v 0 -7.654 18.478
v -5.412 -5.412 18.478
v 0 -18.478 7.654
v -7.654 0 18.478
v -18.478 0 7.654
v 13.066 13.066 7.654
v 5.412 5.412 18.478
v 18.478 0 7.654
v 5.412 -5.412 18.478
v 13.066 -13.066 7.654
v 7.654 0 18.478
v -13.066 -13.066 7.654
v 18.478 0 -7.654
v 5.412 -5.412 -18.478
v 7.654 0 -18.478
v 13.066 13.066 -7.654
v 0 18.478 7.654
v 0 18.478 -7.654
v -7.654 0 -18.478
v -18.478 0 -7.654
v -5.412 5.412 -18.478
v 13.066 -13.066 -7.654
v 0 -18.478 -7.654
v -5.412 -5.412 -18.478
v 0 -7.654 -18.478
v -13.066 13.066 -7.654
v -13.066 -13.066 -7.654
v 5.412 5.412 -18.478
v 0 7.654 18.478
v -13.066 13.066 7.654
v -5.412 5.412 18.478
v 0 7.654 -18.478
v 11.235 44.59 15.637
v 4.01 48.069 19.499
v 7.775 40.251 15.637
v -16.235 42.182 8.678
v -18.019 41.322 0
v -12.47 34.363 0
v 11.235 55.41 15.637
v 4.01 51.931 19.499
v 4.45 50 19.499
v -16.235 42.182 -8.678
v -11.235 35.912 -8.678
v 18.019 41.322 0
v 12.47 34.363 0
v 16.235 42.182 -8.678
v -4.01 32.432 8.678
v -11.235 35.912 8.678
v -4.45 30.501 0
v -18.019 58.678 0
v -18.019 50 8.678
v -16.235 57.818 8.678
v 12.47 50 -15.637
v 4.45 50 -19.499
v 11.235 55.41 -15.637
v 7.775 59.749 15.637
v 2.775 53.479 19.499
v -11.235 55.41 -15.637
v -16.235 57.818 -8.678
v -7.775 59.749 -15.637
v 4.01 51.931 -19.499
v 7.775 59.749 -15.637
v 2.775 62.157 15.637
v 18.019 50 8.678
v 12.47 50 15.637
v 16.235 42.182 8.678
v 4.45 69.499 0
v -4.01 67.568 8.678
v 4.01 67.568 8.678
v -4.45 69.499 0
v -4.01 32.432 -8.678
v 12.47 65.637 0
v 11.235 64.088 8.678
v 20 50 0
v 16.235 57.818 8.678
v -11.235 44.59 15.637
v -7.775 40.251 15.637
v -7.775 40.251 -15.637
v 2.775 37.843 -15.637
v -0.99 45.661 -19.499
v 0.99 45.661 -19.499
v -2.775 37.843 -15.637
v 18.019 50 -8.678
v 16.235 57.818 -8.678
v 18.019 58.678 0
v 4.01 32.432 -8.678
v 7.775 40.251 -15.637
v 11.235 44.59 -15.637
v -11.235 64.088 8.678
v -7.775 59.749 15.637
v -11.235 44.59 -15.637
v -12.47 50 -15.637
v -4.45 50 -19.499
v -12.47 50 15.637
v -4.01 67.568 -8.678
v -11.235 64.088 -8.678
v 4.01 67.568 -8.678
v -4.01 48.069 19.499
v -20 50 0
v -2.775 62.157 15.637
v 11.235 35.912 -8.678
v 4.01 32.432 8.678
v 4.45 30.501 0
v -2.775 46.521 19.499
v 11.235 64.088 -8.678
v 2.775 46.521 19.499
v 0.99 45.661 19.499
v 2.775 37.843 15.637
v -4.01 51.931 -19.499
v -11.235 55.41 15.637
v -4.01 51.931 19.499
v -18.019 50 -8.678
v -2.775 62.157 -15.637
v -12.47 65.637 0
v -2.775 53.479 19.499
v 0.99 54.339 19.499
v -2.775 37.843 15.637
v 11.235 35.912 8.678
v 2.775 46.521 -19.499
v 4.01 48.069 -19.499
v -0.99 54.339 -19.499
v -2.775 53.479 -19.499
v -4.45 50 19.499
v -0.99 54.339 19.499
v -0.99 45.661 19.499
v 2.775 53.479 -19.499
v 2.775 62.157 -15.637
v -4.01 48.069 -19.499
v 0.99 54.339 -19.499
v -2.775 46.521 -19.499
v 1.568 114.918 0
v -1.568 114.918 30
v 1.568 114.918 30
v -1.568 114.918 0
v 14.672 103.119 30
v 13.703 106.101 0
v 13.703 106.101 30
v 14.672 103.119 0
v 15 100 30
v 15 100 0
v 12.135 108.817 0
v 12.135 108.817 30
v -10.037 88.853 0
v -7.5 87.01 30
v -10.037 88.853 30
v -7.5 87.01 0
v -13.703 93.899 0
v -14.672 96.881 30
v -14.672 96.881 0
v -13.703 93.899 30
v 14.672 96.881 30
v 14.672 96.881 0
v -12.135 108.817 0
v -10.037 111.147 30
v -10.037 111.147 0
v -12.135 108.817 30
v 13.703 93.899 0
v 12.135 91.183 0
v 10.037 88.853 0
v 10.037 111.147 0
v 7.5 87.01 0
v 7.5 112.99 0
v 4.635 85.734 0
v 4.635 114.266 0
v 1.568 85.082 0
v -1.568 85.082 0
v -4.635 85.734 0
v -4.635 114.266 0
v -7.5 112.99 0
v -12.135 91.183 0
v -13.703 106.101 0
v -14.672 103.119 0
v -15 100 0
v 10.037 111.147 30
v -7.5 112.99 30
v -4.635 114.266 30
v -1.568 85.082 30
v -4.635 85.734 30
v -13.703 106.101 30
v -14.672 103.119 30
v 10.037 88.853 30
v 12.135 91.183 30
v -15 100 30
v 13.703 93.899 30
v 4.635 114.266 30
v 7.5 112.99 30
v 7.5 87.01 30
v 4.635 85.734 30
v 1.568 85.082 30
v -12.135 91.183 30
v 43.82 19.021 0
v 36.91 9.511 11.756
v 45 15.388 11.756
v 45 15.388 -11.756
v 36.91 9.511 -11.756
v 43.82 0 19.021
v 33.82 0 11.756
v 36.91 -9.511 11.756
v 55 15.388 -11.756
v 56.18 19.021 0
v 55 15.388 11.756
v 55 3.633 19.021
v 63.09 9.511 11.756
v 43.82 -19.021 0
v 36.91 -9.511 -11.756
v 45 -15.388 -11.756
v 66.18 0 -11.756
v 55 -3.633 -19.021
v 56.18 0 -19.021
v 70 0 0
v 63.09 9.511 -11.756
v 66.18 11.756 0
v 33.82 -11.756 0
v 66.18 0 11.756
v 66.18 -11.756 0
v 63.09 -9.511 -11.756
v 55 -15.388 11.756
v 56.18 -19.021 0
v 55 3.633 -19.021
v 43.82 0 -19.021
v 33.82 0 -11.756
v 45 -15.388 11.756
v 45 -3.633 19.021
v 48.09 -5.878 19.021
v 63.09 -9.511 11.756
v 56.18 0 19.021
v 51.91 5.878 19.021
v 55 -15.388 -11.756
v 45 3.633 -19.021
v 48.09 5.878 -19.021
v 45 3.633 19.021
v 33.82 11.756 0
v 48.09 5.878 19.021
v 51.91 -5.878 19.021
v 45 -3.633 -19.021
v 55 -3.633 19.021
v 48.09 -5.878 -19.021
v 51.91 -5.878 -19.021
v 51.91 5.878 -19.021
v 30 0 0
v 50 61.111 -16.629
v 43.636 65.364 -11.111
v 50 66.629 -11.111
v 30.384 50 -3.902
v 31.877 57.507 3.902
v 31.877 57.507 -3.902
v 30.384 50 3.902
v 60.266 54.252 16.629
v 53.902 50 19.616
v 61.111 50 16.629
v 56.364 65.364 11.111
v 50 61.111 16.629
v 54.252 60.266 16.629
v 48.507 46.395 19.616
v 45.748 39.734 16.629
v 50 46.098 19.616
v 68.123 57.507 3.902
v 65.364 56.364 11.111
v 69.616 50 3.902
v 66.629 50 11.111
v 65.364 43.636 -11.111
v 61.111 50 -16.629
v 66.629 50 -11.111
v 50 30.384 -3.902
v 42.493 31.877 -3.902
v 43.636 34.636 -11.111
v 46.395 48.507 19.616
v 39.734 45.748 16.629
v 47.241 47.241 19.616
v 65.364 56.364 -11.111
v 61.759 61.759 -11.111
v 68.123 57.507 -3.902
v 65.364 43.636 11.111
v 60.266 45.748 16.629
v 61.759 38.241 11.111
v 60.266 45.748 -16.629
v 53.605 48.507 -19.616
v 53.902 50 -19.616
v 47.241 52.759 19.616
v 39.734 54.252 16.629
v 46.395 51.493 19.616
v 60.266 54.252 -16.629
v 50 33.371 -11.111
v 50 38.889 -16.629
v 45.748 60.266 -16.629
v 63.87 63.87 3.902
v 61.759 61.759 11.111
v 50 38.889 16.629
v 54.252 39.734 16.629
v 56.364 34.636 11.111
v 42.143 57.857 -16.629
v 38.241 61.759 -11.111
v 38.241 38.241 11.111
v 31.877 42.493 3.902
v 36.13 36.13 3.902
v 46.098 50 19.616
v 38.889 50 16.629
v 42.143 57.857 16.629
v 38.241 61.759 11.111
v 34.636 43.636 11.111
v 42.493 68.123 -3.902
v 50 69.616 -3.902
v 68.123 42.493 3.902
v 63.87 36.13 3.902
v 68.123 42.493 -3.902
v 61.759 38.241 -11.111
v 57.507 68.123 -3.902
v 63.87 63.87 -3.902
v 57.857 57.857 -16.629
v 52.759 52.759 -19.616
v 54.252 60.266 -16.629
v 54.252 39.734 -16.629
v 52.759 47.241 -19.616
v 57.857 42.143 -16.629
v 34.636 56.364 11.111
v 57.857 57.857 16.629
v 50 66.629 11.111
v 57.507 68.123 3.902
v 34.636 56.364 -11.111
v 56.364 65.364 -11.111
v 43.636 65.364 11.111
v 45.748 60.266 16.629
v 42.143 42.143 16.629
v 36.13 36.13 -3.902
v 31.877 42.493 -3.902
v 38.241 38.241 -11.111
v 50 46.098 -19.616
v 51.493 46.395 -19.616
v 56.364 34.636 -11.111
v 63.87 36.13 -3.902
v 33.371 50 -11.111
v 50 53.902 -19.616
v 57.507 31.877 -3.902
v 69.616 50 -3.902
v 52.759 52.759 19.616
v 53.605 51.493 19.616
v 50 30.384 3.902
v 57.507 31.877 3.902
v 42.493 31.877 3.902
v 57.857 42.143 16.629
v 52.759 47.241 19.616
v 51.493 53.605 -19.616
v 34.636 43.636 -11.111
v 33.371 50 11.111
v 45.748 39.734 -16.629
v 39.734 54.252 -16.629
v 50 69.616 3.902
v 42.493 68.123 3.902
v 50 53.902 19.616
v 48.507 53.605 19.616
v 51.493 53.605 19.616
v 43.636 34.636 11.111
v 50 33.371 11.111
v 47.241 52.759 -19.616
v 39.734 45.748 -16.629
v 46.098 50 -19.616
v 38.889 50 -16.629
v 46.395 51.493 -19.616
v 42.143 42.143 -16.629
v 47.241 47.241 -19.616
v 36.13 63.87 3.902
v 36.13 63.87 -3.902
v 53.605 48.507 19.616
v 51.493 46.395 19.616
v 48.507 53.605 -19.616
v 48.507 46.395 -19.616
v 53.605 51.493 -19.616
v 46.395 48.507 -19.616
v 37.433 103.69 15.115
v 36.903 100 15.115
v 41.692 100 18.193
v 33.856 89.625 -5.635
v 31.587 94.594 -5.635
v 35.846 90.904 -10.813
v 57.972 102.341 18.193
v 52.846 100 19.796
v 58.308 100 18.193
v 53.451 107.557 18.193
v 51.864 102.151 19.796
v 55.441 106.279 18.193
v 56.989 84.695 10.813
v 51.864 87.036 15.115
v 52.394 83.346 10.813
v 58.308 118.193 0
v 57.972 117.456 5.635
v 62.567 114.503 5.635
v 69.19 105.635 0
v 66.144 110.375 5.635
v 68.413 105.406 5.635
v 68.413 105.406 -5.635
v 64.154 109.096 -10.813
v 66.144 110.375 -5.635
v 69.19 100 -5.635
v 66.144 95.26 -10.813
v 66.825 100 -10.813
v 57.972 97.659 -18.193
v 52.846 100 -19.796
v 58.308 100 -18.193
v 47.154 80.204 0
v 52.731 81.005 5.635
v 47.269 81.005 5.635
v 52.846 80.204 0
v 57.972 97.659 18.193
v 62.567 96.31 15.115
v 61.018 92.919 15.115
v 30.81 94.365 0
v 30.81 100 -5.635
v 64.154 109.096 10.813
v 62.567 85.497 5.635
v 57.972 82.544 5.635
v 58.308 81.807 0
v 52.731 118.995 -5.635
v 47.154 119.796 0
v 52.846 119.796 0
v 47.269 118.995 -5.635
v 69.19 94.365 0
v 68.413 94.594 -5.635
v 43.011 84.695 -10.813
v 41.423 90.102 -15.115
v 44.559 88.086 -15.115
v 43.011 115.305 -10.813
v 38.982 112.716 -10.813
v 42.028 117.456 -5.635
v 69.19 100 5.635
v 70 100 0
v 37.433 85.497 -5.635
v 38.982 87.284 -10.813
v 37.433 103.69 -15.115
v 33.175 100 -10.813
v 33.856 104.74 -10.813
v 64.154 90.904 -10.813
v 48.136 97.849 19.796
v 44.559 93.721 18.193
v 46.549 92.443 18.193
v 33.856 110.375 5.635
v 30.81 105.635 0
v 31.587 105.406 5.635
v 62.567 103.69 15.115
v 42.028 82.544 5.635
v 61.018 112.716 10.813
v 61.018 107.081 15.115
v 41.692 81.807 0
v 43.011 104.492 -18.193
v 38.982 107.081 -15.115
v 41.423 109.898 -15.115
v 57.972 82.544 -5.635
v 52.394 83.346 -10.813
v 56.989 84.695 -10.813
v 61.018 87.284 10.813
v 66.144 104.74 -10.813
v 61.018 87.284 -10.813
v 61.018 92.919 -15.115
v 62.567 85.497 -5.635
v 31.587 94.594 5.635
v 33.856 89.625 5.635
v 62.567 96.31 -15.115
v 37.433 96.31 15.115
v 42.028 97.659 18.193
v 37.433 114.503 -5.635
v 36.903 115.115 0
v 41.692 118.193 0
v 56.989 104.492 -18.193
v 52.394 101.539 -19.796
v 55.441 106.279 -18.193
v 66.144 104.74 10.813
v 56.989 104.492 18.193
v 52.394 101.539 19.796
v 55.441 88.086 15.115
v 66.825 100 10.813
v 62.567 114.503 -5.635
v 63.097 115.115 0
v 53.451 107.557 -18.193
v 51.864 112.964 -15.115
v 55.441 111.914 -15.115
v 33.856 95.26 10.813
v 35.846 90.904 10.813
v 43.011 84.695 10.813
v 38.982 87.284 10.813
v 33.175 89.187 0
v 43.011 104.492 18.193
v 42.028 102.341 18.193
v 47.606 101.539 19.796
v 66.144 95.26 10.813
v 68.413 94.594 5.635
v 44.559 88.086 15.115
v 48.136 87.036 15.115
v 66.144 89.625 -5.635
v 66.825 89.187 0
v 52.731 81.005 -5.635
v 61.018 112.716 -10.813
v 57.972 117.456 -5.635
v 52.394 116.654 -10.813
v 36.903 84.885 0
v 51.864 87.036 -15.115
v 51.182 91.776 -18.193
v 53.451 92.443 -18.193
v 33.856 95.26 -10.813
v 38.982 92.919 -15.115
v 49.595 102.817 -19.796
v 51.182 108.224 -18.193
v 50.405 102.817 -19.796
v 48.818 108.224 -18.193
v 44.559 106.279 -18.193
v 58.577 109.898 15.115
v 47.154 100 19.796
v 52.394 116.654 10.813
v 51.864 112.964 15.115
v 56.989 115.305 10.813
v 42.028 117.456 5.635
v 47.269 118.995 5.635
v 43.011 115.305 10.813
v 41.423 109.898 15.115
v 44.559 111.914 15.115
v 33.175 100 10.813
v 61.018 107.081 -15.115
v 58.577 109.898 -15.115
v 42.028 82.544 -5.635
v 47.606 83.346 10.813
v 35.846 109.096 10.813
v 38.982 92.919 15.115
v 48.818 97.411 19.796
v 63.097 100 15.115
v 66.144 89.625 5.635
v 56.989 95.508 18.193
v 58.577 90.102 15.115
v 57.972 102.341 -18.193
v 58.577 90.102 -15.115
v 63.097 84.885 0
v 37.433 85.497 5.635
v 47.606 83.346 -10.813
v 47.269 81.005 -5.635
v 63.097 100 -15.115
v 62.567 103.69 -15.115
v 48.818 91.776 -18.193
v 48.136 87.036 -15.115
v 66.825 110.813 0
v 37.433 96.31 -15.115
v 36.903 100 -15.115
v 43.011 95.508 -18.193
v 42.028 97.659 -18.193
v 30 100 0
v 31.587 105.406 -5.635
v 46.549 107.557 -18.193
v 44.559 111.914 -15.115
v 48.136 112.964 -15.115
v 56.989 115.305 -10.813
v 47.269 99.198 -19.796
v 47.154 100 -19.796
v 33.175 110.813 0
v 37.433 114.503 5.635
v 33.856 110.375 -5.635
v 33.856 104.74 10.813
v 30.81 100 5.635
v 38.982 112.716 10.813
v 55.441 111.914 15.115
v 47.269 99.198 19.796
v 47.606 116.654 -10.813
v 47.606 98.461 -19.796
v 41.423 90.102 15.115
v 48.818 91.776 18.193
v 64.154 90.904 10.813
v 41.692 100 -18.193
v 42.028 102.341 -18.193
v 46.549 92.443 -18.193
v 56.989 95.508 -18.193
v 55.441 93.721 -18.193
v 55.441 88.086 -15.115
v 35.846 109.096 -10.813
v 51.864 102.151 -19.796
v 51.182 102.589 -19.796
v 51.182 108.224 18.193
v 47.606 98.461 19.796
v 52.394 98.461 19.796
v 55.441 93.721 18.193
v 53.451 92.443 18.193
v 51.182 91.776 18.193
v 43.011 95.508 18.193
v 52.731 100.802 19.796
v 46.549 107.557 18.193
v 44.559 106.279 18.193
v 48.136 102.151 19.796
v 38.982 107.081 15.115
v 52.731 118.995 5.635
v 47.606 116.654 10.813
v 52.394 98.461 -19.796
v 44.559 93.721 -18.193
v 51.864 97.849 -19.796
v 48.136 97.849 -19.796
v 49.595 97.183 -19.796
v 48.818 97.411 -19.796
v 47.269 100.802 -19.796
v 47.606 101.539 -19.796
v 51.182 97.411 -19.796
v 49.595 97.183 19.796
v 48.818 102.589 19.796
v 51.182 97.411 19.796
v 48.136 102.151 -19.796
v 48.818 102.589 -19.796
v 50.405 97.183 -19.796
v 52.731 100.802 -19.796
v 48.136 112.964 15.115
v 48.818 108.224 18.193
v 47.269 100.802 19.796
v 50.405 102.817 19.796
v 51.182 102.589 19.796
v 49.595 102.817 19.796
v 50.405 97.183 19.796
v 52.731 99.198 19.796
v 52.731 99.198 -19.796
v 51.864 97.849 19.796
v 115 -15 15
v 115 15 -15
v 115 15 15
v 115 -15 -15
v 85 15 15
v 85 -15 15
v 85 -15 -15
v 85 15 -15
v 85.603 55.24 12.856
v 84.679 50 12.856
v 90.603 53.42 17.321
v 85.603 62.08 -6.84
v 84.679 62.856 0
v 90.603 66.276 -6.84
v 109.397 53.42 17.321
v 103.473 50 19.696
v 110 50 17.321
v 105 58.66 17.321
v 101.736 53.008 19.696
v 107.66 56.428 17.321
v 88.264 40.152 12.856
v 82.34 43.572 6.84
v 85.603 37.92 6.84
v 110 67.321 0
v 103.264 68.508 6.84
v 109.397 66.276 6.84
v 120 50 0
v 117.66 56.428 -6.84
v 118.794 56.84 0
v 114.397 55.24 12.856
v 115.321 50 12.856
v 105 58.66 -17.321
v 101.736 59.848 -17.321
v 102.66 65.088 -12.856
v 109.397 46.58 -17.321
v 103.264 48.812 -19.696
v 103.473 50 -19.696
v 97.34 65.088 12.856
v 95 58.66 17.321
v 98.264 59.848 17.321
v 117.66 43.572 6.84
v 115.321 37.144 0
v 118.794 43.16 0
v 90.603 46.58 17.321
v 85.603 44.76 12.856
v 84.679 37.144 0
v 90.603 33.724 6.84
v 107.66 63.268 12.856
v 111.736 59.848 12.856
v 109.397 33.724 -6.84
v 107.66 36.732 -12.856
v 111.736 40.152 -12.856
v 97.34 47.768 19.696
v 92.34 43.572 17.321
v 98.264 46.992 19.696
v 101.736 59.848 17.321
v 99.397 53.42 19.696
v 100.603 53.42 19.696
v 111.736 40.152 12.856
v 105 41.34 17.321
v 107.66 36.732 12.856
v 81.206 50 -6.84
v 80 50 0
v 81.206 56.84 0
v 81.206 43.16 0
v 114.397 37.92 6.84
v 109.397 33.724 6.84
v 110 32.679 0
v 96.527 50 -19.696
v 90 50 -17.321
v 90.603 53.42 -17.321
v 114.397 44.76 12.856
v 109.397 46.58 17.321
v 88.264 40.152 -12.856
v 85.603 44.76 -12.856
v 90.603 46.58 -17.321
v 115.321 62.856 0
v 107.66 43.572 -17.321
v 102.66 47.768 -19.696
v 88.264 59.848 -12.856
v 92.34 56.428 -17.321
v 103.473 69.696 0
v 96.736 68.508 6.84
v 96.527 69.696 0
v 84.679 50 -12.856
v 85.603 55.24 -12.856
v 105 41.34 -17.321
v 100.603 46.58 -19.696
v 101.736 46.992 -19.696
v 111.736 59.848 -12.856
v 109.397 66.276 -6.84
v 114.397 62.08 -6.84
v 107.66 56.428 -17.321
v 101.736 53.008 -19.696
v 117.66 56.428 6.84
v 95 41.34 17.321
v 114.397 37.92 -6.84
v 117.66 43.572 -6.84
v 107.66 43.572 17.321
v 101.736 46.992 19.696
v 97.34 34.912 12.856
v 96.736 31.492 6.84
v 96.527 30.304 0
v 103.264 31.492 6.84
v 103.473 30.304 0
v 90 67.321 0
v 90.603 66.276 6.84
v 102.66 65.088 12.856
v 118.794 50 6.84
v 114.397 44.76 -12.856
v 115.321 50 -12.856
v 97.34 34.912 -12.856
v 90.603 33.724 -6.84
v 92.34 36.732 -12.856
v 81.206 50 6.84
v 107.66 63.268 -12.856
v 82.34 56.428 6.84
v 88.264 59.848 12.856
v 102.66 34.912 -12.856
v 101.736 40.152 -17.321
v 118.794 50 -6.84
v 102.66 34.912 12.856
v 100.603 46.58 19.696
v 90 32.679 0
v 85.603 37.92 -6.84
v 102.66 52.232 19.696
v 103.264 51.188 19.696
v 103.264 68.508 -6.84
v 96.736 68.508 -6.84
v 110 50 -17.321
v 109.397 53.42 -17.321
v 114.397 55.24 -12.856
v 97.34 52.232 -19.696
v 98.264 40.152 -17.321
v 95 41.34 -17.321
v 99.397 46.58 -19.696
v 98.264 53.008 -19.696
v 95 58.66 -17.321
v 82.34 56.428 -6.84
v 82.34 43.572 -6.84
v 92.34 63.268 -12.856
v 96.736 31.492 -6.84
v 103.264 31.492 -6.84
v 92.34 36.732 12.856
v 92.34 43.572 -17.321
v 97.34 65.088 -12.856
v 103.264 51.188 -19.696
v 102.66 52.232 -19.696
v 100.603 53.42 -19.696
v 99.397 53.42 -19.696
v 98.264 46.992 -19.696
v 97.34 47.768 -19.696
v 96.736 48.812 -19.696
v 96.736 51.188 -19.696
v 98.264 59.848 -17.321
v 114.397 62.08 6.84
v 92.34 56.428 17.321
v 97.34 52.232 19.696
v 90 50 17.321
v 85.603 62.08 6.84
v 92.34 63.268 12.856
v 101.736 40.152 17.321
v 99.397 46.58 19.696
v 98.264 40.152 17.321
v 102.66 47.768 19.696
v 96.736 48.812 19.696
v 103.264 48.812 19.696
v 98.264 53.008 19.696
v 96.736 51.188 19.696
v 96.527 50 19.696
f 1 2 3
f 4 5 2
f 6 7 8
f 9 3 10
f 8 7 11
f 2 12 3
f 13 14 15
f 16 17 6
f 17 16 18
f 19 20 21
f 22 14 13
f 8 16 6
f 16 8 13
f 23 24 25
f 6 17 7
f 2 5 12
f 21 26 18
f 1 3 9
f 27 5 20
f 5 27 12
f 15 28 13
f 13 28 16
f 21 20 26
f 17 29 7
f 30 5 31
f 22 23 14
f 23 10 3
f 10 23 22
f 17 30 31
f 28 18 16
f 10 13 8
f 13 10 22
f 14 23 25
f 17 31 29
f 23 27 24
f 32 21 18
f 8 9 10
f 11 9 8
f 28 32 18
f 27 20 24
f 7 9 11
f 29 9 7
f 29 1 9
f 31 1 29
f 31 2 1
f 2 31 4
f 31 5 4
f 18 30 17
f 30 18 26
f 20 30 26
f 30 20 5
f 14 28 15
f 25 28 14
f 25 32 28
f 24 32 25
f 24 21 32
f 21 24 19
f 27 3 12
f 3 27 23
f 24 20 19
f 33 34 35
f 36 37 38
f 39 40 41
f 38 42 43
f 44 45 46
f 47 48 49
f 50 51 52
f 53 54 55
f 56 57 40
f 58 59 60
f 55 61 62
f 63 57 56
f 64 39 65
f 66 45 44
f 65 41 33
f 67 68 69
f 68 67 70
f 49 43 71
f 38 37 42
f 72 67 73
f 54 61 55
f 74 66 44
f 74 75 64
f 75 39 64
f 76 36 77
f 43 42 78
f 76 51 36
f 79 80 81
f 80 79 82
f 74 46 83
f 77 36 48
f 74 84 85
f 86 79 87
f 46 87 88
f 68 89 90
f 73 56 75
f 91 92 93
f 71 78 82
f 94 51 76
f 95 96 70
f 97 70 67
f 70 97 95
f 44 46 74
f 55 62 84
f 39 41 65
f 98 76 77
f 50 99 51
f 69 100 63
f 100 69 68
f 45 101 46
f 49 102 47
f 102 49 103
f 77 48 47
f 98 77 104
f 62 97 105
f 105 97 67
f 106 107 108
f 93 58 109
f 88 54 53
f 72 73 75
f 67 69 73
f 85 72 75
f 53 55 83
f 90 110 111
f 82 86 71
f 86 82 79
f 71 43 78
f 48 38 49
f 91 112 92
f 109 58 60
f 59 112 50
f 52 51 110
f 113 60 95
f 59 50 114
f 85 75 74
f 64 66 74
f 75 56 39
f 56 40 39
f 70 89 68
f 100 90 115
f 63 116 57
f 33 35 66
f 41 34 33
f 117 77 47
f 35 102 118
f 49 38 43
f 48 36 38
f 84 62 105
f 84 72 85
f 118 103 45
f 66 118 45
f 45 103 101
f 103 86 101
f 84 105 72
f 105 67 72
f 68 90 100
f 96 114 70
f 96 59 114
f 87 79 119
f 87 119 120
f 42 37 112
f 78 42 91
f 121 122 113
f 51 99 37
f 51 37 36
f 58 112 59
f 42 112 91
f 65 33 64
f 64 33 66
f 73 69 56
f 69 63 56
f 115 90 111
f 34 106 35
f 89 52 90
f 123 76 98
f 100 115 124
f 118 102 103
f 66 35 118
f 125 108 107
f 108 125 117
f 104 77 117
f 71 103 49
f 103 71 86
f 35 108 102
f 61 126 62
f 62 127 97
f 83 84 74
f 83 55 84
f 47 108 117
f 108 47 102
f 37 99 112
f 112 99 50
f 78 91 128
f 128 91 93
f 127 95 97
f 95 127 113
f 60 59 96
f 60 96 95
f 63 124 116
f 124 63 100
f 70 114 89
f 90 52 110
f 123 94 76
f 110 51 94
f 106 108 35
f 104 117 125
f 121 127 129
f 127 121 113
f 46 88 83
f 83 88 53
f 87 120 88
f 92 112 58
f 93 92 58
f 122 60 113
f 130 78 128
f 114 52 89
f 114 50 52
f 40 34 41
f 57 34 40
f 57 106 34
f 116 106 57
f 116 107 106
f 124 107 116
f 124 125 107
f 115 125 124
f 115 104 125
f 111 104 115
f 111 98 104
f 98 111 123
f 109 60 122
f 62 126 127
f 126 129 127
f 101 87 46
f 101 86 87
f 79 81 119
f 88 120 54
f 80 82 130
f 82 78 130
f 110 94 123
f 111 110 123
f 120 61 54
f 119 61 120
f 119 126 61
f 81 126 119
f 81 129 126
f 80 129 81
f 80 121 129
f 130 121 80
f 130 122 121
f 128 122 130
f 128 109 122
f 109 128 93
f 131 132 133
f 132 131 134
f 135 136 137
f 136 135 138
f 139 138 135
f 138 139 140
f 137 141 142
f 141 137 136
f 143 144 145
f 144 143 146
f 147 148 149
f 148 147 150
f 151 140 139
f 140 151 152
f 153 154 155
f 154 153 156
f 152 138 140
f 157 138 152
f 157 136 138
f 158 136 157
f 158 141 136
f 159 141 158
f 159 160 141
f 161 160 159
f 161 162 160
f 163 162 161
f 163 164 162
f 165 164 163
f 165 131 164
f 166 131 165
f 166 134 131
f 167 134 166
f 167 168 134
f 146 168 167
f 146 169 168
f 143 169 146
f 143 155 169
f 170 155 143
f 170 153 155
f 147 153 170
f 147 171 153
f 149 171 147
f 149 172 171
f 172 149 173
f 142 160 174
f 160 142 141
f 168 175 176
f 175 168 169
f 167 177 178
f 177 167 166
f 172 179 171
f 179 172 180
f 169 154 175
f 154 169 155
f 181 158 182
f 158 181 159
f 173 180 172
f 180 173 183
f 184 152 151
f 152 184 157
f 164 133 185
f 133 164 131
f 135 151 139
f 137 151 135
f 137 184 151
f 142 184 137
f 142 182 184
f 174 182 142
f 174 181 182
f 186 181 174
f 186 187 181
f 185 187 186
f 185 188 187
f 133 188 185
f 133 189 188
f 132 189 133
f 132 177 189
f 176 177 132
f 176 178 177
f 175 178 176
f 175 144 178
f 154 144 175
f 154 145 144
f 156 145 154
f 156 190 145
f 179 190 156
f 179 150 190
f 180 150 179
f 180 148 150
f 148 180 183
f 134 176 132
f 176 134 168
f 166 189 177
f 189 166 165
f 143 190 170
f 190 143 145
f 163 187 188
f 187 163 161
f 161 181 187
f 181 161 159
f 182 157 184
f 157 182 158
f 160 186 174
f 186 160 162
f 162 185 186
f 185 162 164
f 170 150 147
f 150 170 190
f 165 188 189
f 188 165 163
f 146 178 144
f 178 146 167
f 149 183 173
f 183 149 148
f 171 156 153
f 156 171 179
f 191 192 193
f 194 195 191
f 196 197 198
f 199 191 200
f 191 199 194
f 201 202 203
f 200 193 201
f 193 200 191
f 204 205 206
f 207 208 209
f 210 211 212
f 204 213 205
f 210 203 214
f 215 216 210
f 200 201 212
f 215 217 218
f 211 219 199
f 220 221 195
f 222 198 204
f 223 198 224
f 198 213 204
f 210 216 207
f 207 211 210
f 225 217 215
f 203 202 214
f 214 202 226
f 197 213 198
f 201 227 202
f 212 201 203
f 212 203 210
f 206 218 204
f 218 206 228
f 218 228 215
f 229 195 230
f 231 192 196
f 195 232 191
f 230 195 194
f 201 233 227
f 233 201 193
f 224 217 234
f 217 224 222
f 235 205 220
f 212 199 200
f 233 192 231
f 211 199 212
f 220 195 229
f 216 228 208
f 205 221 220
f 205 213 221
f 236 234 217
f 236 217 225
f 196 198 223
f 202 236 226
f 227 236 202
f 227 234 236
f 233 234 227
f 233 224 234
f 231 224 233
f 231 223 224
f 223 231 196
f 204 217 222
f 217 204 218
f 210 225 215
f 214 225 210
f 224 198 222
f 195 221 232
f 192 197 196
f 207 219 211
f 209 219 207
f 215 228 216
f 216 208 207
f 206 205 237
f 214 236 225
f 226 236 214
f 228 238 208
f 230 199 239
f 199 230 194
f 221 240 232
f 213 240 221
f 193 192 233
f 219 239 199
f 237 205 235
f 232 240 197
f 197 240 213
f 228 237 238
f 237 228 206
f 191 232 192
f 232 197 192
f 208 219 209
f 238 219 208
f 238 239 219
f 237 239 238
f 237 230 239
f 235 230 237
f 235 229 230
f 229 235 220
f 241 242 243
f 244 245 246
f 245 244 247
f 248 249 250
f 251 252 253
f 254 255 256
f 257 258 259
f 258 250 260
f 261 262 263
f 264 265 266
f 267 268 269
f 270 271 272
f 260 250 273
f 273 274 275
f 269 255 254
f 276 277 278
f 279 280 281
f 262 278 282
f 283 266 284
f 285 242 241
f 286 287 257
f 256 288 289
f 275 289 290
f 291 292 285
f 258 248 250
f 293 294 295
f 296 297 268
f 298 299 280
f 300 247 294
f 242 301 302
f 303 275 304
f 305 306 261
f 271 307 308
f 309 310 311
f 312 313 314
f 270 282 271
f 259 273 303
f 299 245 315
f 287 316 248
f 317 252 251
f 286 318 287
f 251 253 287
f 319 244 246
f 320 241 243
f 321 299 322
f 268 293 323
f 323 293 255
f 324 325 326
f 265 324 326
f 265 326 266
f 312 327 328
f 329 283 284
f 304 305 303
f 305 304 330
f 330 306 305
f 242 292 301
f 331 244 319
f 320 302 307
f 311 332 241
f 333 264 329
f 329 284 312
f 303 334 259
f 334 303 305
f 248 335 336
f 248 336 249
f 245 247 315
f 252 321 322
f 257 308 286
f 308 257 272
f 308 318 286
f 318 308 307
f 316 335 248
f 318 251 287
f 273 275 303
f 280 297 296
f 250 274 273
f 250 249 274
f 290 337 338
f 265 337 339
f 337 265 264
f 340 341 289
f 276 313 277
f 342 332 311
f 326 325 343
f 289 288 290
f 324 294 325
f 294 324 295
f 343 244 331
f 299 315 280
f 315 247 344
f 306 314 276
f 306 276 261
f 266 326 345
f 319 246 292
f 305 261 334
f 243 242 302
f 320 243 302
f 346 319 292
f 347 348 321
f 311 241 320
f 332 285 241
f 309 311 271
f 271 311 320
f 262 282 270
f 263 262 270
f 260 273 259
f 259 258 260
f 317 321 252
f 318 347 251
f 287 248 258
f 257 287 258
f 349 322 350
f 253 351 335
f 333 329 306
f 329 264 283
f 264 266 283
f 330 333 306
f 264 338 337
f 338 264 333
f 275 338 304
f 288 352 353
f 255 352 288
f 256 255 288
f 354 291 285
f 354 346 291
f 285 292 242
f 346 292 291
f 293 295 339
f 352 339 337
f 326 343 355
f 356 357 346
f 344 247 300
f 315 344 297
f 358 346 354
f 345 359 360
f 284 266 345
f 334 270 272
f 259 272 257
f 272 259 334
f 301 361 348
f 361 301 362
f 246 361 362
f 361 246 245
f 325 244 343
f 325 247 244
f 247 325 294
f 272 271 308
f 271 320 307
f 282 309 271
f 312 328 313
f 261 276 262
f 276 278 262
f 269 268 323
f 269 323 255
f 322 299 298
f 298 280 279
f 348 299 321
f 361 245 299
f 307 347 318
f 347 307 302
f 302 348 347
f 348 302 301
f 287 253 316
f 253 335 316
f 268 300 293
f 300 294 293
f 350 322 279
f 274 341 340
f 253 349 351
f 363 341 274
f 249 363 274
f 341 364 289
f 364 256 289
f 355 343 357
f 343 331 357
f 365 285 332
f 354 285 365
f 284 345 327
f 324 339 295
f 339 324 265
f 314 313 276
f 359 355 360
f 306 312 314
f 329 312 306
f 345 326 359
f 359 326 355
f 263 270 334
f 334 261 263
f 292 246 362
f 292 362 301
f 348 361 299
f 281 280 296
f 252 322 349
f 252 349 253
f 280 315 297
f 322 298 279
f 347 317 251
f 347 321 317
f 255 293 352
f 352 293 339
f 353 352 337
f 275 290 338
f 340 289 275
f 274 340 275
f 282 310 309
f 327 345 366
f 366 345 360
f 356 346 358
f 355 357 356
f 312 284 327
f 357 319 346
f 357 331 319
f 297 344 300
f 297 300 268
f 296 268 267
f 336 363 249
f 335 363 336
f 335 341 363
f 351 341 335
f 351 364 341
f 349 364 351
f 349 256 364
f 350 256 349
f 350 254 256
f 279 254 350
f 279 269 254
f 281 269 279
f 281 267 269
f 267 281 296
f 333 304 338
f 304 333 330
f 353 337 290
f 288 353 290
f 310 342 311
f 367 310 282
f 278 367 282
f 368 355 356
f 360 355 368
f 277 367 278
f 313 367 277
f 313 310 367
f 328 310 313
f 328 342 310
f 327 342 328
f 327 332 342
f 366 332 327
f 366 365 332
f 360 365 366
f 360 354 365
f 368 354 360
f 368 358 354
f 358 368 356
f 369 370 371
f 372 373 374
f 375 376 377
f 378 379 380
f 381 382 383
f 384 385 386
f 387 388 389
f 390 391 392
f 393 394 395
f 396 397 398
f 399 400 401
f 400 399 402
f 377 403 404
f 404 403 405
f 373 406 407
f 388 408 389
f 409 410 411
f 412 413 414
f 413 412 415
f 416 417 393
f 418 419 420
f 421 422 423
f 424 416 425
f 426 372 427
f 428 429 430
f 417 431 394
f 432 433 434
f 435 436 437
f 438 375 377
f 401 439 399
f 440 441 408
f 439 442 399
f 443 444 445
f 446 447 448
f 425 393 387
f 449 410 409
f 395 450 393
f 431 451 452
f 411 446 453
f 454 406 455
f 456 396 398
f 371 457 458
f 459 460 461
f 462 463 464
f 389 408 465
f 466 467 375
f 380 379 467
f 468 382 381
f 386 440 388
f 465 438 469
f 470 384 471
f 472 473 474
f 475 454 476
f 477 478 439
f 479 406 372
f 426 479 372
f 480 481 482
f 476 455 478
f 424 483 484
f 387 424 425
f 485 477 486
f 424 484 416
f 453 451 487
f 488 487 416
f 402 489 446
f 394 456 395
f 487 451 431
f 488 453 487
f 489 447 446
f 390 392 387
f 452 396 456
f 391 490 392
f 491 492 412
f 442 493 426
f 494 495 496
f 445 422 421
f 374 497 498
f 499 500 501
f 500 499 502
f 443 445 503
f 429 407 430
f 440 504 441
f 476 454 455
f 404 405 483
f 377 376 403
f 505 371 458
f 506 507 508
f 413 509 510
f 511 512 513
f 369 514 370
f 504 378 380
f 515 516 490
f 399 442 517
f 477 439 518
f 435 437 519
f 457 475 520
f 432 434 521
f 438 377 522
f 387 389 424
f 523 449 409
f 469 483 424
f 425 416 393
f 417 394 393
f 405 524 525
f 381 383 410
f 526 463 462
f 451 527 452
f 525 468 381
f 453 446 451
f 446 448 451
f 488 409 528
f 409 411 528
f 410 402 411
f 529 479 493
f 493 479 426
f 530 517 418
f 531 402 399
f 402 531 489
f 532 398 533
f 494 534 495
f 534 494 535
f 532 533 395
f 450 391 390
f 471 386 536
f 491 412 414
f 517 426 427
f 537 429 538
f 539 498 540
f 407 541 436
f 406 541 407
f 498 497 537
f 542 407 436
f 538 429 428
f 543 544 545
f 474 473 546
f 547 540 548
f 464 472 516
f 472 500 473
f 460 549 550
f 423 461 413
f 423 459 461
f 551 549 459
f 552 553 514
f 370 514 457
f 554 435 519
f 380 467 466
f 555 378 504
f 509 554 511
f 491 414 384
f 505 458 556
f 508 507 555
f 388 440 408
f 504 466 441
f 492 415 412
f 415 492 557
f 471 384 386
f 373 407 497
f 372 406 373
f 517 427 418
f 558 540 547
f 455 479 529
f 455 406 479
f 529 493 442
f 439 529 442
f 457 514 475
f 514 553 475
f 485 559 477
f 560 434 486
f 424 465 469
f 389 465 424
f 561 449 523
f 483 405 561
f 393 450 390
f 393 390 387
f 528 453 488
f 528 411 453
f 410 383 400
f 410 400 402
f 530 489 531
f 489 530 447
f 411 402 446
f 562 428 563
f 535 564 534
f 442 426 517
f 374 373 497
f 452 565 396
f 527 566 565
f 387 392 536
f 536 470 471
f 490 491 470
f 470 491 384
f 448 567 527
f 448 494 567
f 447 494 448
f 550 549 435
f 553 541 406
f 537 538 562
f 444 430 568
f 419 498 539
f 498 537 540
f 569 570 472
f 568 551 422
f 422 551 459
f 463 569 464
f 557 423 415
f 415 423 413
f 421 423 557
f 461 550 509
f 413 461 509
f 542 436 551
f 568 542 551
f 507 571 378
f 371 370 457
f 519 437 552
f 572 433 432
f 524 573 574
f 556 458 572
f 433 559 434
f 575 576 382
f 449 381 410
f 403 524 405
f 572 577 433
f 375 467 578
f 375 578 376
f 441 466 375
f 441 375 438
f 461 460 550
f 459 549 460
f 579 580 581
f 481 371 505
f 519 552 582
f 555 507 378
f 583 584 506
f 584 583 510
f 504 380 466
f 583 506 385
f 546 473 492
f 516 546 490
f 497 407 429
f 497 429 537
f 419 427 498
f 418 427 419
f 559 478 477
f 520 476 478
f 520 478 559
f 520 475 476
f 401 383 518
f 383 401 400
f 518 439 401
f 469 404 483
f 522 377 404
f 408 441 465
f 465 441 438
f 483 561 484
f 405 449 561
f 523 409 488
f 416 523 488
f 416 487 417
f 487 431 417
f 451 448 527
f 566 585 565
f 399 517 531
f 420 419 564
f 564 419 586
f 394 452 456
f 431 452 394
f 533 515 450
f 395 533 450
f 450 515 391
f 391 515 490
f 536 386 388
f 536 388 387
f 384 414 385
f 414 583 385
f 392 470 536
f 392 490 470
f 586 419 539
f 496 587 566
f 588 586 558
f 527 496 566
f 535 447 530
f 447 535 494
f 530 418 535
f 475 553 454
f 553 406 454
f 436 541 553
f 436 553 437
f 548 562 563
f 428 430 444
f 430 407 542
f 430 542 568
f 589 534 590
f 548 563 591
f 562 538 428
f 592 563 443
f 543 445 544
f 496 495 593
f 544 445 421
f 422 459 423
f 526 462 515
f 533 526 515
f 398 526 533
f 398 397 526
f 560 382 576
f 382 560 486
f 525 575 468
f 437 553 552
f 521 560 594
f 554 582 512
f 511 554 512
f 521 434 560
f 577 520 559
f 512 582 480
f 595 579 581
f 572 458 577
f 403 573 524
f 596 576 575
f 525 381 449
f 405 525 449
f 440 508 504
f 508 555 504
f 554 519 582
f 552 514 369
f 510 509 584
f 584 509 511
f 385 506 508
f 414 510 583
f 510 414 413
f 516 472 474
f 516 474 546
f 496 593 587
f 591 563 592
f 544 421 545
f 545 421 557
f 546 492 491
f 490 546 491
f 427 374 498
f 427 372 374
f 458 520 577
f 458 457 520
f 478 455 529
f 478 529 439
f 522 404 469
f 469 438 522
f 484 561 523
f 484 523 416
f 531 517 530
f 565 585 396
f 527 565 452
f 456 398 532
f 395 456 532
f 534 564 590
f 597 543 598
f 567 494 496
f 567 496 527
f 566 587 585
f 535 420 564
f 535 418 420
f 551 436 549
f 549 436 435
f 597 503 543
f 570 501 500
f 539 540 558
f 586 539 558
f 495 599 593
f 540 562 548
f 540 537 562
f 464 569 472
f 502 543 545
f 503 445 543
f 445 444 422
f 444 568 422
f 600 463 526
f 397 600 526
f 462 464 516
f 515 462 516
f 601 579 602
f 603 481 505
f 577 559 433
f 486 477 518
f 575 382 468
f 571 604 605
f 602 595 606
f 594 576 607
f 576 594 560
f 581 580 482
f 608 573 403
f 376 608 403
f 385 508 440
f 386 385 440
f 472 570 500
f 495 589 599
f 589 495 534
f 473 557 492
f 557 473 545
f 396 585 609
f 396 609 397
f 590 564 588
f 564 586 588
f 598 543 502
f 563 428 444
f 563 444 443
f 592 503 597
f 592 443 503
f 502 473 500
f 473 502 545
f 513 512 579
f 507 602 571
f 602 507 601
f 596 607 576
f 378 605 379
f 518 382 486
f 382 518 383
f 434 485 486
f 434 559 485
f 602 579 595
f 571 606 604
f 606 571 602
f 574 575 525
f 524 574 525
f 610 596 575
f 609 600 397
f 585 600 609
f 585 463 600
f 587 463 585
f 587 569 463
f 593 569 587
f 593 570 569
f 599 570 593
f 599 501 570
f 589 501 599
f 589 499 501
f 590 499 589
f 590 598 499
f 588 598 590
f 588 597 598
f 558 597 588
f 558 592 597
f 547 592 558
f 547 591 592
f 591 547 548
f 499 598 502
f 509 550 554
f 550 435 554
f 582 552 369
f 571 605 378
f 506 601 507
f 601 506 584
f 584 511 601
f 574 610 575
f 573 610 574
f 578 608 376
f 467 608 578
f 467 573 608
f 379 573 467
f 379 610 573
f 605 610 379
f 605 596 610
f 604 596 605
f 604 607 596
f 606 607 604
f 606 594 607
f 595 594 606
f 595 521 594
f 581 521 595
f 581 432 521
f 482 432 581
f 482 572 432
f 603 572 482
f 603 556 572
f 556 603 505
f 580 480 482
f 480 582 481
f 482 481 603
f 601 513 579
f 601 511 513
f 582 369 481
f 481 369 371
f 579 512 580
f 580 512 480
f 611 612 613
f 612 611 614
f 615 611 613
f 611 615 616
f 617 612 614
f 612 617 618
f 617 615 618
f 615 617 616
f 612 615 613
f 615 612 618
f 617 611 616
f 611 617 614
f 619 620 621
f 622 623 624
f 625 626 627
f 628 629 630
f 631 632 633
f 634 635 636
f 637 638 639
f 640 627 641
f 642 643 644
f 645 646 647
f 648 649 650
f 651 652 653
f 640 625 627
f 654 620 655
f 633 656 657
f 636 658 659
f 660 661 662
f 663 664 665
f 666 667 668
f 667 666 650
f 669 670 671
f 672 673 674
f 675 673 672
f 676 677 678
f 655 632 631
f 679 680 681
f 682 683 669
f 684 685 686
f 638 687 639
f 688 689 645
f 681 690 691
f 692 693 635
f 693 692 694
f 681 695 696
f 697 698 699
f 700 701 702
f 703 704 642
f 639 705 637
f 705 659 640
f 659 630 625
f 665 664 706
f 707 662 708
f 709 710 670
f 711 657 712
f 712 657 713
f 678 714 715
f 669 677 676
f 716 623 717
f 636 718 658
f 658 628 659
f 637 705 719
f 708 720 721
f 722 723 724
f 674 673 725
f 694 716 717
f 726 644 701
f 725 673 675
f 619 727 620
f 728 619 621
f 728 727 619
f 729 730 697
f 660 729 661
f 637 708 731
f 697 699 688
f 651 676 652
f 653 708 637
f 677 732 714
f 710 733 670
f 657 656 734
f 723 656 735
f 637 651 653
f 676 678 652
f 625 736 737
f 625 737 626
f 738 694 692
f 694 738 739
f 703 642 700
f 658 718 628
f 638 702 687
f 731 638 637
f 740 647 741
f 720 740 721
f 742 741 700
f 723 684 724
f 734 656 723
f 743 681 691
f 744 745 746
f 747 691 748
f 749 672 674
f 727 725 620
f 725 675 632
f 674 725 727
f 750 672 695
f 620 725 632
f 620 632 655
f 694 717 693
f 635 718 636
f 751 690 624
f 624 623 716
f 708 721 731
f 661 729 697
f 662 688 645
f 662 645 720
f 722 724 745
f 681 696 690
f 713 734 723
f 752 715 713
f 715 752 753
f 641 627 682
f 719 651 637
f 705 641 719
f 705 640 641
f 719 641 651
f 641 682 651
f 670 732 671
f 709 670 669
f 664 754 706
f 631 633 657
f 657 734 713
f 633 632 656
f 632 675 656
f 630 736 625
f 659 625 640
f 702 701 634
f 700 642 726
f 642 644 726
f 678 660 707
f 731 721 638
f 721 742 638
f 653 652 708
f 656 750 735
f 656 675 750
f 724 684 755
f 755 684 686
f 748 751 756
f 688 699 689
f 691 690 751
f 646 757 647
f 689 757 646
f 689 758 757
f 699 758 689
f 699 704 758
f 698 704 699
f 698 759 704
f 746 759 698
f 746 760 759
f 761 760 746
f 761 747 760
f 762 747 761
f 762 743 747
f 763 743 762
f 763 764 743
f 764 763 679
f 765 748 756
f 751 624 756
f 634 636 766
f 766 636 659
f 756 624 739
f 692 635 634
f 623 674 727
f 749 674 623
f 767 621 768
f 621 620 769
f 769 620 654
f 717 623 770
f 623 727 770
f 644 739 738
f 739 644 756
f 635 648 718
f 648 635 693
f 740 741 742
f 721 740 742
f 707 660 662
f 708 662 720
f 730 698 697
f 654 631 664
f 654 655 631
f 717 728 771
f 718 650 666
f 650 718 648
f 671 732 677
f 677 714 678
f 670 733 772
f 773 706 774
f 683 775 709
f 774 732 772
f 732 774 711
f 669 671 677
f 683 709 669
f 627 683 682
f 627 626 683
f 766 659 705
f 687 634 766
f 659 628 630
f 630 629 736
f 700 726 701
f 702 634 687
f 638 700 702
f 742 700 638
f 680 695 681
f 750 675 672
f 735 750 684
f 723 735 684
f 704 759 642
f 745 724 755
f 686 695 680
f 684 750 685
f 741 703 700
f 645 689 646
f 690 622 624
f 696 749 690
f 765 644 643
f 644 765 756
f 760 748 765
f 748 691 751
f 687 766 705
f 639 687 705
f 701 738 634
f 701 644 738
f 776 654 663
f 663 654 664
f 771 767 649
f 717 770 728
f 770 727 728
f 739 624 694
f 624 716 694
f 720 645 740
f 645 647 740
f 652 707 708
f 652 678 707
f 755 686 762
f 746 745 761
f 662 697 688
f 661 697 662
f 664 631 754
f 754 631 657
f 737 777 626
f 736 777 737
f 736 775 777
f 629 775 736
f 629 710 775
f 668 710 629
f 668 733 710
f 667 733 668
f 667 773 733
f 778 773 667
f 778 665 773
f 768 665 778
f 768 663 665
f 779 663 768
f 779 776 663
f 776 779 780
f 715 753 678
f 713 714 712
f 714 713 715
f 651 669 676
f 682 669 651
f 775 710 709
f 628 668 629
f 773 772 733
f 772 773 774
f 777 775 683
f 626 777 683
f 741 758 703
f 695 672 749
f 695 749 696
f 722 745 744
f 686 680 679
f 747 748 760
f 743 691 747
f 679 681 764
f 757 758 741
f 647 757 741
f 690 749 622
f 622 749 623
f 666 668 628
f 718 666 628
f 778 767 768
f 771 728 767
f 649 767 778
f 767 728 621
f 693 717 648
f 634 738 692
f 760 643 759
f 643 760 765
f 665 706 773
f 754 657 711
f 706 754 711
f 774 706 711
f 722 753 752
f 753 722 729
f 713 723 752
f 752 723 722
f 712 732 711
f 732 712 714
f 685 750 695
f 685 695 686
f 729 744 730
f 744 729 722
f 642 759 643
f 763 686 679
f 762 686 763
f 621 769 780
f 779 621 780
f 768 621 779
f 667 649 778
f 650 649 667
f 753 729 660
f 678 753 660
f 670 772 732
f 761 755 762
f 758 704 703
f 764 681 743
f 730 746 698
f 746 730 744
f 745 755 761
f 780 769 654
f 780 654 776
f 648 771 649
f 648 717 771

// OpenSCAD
 // Arrange its children in a regular rectangular array
 //      spacing - the space between children origins
 //      n       - the number of children along x axis
 module arrange(spacing=50, n=5) {
 
    translate([-spacing,0,0]){
 
    //arrange
    nparts = $children;
    for(i=[0:1:n-1], j=[0:nparts/n])
        if (i+n*j < nparts)
            translate([spacing*(i+1), spacing*j, 0]) 
                children(i+n*j);
                
                
    }
 }

 arrange(spacing=50,n=3) {
    sphere(r=20,$fn=8);
    sphere(r=20,$fn=10);
    cube(30,center=true);
    sphere(r=20,$fn=14);
    sphere(r=20,$fn=16);
    sphere(r=20,$fn=18);
    cylinder(r=15,h=30);
    sphere(r=20,$fn=22);
 }
